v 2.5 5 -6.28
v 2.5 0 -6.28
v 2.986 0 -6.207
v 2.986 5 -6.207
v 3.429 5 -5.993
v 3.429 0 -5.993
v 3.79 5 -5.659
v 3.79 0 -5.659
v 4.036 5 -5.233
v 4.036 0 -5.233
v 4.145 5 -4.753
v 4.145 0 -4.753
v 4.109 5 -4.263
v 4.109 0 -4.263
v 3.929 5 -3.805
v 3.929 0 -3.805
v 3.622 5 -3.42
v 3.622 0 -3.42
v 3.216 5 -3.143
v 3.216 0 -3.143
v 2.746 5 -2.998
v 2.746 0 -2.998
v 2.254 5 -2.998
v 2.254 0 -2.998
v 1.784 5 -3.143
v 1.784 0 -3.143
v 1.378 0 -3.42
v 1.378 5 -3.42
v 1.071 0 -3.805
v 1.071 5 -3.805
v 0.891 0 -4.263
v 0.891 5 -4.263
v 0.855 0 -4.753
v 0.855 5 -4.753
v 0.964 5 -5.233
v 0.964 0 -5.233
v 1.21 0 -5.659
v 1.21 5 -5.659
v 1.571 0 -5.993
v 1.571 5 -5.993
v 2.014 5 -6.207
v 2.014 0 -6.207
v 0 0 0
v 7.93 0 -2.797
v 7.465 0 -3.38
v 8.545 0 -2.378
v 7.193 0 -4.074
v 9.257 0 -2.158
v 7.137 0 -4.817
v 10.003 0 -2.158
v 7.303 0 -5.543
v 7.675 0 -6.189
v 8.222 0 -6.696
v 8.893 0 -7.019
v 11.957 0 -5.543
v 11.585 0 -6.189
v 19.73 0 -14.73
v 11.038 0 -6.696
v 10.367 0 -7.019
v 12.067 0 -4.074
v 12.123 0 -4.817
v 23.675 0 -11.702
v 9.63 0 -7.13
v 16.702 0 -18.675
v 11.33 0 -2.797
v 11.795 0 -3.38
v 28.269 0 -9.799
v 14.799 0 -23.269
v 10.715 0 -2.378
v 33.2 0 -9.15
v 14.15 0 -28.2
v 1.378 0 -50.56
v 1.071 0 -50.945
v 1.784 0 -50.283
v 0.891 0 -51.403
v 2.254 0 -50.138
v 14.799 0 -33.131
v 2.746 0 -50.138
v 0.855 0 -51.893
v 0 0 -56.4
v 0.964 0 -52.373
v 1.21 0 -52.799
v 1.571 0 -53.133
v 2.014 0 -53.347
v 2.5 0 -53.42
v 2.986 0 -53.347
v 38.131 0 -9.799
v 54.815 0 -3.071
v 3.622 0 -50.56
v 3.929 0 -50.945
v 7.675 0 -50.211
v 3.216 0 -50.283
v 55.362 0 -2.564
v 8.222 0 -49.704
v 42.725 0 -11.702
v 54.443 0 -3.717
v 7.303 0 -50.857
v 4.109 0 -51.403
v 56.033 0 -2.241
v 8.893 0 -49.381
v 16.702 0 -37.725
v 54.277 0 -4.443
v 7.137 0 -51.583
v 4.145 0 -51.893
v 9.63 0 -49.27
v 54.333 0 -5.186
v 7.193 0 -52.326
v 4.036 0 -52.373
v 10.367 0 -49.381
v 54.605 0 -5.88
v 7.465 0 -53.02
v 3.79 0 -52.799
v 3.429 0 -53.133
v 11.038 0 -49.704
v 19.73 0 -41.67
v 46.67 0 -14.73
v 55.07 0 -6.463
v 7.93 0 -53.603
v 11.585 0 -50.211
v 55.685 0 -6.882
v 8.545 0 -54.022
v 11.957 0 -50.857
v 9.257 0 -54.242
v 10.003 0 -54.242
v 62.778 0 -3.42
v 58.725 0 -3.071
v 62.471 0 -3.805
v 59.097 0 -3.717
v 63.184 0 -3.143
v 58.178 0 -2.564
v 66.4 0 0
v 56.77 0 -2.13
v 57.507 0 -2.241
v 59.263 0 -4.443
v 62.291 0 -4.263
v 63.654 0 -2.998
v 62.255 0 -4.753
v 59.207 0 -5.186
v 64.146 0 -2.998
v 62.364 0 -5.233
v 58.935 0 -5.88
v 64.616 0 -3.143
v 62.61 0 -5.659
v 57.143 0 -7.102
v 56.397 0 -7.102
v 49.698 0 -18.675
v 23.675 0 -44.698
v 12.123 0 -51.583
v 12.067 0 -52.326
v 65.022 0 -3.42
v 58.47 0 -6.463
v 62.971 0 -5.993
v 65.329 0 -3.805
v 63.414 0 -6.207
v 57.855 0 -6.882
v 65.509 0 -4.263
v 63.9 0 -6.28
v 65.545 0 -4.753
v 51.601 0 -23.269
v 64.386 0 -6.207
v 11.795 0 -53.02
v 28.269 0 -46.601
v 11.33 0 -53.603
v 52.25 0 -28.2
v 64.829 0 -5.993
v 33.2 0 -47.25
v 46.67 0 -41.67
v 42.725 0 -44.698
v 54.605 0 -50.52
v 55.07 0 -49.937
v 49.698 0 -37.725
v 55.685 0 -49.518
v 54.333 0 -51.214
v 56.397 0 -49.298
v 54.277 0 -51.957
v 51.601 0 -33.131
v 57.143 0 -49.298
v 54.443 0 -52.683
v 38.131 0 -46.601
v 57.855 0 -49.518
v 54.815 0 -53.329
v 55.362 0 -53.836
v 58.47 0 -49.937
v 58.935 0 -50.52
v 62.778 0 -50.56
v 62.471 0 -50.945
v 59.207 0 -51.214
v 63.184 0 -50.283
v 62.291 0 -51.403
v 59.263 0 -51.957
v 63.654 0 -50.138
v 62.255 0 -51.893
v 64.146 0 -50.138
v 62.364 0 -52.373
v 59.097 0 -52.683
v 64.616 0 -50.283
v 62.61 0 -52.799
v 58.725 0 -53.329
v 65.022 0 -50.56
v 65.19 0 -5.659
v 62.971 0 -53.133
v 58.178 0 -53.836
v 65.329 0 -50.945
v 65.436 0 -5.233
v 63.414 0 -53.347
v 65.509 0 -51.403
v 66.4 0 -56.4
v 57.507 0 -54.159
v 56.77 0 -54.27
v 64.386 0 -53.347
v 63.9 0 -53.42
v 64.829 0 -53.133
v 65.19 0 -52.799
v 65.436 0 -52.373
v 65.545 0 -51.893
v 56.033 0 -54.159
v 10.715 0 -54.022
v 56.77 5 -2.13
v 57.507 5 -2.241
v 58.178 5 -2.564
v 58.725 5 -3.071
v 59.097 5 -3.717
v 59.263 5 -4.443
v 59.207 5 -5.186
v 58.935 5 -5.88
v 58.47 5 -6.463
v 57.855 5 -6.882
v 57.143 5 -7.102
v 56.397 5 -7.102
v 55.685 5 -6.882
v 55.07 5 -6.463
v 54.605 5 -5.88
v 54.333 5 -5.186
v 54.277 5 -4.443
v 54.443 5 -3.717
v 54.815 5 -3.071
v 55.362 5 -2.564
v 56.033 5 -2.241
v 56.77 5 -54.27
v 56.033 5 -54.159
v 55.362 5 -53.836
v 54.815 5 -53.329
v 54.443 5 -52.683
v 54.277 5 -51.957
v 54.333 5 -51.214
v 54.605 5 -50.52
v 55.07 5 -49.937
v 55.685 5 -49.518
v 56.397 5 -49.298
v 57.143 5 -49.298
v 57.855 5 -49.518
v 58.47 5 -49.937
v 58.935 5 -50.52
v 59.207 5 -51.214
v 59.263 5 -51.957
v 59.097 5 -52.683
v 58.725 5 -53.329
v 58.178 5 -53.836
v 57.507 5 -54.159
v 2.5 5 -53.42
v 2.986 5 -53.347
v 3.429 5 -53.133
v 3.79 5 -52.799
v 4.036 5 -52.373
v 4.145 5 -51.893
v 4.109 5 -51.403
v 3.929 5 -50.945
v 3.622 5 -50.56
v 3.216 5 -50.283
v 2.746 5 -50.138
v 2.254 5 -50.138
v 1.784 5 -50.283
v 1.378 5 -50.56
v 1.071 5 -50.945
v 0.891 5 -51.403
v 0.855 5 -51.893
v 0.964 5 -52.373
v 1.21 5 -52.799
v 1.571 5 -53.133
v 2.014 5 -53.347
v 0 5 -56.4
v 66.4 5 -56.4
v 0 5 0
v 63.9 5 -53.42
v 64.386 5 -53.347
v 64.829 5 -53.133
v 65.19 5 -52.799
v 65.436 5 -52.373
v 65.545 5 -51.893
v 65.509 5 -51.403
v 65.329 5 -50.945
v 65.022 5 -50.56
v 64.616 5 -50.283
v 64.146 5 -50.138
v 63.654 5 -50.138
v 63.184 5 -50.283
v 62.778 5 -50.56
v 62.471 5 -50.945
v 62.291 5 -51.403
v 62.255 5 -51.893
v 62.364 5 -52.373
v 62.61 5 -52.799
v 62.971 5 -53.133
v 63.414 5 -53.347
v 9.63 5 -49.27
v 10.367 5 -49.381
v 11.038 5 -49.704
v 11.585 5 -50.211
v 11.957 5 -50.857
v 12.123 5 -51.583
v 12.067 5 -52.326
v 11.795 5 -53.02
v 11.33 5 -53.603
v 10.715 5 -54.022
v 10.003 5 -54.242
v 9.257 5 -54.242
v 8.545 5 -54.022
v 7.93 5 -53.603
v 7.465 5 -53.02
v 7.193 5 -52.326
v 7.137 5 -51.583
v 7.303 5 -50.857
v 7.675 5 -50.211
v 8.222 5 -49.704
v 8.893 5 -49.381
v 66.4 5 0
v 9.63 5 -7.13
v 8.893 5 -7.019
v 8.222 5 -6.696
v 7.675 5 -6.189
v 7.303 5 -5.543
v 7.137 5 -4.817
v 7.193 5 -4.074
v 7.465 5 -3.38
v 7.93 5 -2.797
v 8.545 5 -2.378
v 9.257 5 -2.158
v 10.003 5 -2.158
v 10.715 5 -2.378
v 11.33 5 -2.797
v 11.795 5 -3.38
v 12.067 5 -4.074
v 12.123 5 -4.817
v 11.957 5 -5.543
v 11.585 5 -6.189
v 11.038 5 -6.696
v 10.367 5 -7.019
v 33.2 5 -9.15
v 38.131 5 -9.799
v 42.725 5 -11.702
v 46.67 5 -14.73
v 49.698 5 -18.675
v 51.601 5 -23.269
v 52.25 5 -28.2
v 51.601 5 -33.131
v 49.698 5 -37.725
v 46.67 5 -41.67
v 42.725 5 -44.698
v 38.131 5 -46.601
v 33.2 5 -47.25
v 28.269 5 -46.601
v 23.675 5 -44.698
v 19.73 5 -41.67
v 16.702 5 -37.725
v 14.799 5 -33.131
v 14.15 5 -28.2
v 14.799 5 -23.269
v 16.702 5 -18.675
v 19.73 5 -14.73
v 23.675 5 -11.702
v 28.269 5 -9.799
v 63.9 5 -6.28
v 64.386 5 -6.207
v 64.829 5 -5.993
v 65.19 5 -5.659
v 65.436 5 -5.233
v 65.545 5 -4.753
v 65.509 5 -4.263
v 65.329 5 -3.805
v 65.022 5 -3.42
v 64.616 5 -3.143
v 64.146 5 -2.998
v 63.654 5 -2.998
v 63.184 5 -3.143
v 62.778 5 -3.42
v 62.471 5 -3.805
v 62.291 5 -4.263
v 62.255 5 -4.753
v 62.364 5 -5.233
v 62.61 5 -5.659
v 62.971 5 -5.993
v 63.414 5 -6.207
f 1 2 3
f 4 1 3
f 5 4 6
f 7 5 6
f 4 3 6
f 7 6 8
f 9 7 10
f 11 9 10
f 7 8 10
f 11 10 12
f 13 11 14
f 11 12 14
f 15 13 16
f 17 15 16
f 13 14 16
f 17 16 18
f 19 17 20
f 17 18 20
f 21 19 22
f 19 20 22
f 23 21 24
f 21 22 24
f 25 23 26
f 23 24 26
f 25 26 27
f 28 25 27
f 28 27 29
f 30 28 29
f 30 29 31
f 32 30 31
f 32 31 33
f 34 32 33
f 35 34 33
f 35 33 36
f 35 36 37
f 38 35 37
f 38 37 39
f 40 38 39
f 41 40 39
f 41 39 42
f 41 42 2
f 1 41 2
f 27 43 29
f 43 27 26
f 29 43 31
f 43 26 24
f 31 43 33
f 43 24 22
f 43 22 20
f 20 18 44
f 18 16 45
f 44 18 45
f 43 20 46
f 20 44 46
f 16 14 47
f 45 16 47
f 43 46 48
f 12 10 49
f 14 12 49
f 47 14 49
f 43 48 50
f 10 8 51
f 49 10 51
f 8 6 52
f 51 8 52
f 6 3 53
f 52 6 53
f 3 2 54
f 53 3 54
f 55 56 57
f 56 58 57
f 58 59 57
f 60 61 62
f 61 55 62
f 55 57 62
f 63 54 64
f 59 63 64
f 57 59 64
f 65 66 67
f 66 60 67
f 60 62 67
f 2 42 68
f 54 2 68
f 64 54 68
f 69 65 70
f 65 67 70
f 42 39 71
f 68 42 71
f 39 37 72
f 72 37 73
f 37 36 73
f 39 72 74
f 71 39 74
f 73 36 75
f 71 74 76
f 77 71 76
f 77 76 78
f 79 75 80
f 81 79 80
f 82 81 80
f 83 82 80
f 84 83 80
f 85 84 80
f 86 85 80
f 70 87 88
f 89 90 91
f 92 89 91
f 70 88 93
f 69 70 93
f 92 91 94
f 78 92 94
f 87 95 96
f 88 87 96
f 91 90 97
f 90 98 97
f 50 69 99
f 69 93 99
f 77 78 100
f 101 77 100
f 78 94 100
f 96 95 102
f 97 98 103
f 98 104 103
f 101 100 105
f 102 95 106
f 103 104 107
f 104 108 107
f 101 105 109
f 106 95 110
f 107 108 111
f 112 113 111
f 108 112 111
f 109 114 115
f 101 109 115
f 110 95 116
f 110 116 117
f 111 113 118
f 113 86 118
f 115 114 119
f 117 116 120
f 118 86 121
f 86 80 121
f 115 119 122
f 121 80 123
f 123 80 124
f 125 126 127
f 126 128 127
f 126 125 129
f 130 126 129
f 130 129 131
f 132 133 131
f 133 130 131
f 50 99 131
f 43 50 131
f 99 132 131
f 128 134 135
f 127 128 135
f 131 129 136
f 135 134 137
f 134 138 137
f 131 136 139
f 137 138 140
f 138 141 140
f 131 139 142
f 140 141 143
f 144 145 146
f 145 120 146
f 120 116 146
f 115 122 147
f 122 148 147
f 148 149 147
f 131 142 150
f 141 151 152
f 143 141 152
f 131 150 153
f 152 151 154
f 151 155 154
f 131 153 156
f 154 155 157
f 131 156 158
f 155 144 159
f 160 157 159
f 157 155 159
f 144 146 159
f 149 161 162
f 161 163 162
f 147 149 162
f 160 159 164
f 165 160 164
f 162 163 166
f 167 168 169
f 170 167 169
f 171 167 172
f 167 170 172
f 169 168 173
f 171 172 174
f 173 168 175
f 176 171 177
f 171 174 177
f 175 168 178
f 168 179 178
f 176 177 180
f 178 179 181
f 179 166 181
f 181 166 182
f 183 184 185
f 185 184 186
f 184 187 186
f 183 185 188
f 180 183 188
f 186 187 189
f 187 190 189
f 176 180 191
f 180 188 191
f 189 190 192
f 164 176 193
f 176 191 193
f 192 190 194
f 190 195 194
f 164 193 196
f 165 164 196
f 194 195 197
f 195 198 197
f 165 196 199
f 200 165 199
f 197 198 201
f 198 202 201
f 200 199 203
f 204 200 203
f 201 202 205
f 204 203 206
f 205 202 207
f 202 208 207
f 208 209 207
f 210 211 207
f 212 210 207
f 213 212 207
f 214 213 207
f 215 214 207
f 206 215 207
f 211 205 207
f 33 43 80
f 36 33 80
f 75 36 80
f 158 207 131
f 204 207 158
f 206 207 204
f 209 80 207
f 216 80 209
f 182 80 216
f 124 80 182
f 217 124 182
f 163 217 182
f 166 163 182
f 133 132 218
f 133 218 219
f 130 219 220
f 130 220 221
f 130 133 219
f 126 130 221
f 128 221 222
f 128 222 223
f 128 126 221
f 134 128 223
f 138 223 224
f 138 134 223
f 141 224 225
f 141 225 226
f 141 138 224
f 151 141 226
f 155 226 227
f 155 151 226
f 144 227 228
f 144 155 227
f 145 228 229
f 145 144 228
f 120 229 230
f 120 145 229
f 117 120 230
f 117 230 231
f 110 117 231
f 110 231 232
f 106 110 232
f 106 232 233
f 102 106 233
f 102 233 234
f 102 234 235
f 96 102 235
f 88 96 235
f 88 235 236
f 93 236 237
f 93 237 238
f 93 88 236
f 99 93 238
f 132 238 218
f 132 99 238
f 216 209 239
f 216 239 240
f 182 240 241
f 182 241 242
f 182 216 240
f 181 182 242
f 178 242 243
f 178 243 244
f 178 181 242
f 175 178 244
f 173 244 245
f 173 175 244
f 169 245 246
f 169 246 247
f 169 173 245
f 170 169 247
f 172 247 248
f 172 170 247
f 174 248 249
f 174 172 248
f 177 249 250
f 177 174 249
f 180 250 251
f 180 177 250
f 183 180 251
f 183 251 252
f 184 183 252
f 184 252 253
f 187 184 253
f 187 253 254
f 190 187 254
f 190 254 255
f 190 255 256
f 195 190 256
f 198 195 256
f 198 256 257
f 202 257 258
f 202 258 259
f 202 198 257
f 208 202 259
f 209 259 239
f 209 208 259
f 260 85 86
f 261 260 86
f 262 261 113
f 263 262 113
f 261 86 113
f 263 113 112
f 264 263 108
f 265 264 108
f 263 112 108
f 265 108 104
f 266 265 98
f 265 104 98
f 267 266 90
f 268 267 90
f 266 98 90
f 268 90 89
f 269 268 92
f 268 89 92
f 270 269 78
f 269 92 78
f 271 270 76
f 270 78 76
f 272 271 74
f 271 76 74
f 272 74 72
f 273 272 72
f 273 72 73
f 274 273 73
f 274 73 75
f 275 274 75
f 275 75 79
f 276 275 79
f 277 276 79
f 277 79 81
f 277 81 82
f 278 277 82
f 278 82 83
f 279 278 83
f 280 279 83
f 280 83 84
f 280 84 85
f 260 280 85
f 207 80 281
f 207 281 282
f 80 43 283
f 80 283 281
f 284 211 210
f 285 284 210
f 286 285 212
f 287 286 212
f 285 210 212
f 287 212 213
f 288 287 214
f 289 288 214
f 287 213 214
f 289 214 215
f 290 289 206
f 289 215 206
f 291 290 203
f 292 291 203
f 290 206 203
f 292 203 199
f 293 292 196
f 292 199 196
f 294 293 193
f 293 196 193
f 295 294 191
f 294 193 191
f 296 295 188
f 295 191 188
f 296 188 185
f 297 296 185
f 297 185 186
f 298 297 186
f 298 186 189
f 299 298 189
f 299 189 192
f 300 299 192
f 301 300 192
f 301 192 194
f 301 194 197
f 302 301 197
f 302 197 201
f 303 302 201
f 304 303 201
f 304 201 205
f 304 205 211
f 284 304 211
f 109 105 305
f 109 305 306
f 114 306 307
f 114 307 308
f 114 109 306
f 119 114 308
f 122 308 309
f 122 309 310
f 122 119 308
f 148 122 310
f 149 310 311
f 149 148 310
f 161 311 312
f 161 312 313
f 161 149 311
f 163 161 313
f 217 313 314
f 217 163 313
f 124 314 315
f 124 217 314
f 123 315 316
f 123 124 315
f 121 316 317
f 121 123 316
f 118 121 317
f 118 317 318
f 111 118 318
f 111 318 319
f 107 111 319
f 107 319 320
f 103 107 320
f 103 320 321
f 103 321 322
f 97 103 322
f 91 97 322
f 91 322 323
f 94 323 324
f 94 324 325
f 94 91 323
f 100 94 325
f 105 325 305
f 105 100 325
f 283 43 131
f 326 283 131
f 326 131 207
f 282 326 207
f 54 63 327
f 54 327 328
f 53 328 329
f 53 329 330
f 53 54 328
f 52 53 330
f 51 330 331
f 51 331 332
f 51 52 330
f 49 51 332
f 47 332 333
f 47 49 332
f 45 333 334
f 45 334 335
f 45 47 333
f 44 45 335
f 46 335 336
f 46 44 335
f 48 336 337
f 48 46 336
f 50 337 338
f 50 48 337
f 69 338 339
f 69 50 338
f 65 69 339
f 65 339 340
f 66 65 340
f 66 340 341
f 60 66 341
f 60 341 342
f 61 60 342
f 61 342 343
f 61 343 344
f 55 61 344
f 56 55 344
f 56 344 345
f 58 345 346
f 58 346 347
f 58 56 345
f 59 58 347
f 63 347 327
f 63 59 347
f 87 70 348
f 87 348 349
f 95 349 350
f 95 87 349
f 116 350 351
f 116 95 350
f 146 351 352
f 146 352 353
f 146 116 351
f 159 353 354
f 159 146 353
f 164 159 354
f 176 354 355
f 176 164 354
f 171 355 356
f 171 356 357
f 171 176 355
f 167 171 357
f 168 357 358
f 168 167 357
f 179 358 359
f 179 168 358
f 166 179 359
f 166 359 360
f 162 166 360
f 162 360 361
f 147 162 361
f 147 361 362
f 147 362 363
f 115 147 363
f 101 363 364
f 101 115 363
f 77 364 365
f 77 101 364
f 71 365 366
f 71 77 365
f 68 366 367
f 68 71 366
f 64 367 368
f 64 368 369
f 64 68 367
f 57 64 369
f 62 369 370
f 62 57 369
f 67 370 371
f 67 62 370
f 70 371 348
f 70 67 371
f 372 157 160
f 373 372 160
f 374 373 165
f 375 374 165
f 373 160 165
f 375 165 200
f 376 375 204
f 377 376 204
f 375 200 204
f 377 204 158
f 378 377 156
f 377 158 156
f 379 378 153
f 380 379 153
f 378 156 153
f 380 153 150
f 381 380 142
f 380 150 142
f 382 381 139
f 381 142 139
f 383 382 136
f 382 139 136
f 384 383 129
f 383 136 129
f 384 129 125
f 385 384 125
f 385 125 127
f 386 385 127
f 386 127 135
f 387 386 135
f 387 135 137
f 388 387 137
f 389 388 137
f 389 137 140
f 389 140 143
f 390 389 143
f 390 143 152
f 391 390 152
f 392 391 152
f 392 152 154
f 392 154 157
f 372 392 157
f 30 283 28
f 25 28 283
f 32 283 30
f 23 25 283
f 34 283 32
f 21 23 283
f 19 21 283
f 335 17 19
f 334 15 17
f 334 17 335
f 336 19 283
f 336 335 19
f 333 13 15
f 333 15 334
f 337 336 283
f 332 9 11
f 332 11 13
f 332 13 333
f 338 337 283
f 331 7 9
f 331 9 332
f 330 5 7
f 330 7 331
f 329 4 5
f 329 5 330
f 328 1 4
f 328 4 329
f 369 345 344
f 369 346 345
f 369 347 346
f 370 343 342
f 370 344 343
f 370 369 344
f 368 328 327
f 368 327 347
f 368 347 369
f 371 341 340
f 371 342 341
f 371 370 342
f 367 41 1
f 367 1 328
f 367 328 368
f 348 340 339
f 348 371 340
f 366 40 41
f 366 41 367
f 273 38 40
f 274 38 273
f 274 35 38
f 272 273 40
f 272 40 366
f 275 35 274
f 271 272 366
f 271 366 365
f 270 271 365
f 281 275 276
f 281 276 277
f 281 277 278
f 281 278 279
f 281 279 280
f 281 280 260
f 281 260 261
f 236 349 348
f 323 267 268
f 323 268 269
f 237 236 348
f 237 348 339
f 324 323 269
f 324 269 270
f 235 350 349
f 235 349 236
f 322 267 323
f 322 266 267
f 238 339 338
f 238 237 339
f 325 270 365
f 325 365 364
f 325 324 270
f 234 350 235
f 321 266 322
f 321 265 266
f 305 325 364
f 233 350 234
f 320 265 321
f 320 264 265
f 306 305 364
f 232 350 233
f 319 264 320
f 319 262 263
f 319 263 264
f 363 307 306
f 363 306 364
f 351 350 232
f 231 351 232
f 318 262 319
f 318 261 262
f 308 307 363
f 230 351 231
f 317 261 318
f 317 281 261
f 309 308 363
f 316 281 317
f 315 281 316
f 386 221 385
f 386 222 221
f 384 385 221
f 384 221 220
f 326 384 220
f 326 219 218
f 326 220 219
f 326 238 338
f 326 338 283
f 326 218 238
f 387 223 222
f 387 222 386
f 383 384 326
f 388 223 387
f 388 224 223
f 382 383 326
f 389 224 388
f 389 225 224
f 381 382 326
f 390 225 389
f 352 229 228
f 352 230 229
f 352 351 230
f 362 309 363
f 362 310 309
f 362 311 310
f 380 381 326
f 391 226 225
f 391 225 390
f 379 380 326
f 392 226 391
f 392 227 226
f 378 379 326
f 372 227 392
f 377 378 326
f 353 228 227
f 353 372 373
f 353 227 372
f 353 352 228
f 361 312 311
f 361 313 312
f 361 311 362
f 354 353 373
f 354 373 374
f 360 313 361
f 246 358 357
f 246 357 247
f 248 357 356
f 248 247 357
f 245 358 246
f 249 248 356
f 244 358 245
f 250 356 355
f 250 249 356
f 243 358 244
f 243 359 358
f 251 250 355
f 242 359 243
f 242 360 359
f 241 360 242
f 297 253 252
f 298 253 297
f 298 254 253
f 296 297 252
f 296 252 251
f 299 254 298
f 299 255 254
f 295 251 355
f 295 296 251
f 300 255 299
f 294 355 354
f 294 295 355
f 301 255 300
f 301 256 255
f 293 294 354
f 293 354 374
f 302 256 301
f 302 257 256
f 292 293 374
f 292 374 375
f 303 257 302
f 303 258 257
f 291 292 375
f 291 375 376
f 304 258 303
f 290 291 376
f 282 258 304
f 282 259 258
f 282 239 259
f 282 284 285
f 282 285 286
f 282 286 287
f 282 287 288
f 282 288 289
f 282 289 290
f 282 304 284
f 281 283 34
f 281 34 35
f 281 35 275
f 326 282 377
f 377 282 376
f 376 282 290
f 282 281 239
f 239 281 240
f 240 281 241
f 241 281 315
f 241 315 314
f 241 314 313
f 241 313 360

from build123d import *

# Parameters (mm, degrees)
SZKIC1_W                    = 66.4
SZKIC1_H                    = 56.4
SZKIC1_R                    = 19.05
SZKIC1_R_2                  = 2.5
DODANIE_WYCI_GNI_CIE1_DEPTH = 5
OTW_R_GWINTOWANY_M41_D      = 3.3
OTW_R_GWINTOWANY_M42_D      = 3.3


with BuildPart() as part:
    # Szkic1 → Dodanie-wyciągnięcie1 (new body)
    with BuildSketch(Plane(origin=(0, 0, 0), x_dir=(1, 0, 0), z_dir=(0, 1, 0))):
        with Locations((33.2, 28.2)):
            Rectangle(SZKIC1_W, SZKIC1_H)
        with Locations(Location((33.2, 28.2, 0), (0, 0, 270))):
            Circle(SZKIC1_R, mode=Mode.SUBTRACT)
        with Locations(Location((9.63, 51.77, 0), (0, 0, 270))):
            Circle(SZKIC1_R_2, mode=Mode.SUBTRACT)
        with Locations(Location((56.77, 51.77, 0), (0, 0, 90))):
            Circle(SZKIC1_R_2, mode=Mode.SUBTRACT)
        with Locations(Location((56.77, 4.63, 0), (0, 0, 270))):
            Circle(SZKIC1_R_2, mode=Mode.SUBTRACT)
        with Locations(Location((9.63, 4.63, 0), (0, 0, 90))):
            Circle(SZKIC1_R_2, mode=Mode.SUBTRACT)
    extrude(amount=DODANIE_WYCI_GNI_CIE1_DEPTH)

    # Otwór gwintowany M41 (through all)
    with Locations(Plane(origin=(2.5, 5, -51.77), x_dir=(0, 0, 1), z_dir=(0, 1, 0))):
        with Locations((0, 0)):
            Hole(OTW_R_GWINTOWANY_M41_D / 2)

    # Otwór gwintowany M42 (through all)
    with Locations(Plane(origin=(63.9, 5, -51.77), x_dir=(0, 0, 1), z_dir=(0, 1, 0))):
        with Locations((0, 0), (47.14, 0), (47.14, -61.4)):
            Hole(OTW_R_GWINTOWANY_M42_D / 2)


solid = part.part
